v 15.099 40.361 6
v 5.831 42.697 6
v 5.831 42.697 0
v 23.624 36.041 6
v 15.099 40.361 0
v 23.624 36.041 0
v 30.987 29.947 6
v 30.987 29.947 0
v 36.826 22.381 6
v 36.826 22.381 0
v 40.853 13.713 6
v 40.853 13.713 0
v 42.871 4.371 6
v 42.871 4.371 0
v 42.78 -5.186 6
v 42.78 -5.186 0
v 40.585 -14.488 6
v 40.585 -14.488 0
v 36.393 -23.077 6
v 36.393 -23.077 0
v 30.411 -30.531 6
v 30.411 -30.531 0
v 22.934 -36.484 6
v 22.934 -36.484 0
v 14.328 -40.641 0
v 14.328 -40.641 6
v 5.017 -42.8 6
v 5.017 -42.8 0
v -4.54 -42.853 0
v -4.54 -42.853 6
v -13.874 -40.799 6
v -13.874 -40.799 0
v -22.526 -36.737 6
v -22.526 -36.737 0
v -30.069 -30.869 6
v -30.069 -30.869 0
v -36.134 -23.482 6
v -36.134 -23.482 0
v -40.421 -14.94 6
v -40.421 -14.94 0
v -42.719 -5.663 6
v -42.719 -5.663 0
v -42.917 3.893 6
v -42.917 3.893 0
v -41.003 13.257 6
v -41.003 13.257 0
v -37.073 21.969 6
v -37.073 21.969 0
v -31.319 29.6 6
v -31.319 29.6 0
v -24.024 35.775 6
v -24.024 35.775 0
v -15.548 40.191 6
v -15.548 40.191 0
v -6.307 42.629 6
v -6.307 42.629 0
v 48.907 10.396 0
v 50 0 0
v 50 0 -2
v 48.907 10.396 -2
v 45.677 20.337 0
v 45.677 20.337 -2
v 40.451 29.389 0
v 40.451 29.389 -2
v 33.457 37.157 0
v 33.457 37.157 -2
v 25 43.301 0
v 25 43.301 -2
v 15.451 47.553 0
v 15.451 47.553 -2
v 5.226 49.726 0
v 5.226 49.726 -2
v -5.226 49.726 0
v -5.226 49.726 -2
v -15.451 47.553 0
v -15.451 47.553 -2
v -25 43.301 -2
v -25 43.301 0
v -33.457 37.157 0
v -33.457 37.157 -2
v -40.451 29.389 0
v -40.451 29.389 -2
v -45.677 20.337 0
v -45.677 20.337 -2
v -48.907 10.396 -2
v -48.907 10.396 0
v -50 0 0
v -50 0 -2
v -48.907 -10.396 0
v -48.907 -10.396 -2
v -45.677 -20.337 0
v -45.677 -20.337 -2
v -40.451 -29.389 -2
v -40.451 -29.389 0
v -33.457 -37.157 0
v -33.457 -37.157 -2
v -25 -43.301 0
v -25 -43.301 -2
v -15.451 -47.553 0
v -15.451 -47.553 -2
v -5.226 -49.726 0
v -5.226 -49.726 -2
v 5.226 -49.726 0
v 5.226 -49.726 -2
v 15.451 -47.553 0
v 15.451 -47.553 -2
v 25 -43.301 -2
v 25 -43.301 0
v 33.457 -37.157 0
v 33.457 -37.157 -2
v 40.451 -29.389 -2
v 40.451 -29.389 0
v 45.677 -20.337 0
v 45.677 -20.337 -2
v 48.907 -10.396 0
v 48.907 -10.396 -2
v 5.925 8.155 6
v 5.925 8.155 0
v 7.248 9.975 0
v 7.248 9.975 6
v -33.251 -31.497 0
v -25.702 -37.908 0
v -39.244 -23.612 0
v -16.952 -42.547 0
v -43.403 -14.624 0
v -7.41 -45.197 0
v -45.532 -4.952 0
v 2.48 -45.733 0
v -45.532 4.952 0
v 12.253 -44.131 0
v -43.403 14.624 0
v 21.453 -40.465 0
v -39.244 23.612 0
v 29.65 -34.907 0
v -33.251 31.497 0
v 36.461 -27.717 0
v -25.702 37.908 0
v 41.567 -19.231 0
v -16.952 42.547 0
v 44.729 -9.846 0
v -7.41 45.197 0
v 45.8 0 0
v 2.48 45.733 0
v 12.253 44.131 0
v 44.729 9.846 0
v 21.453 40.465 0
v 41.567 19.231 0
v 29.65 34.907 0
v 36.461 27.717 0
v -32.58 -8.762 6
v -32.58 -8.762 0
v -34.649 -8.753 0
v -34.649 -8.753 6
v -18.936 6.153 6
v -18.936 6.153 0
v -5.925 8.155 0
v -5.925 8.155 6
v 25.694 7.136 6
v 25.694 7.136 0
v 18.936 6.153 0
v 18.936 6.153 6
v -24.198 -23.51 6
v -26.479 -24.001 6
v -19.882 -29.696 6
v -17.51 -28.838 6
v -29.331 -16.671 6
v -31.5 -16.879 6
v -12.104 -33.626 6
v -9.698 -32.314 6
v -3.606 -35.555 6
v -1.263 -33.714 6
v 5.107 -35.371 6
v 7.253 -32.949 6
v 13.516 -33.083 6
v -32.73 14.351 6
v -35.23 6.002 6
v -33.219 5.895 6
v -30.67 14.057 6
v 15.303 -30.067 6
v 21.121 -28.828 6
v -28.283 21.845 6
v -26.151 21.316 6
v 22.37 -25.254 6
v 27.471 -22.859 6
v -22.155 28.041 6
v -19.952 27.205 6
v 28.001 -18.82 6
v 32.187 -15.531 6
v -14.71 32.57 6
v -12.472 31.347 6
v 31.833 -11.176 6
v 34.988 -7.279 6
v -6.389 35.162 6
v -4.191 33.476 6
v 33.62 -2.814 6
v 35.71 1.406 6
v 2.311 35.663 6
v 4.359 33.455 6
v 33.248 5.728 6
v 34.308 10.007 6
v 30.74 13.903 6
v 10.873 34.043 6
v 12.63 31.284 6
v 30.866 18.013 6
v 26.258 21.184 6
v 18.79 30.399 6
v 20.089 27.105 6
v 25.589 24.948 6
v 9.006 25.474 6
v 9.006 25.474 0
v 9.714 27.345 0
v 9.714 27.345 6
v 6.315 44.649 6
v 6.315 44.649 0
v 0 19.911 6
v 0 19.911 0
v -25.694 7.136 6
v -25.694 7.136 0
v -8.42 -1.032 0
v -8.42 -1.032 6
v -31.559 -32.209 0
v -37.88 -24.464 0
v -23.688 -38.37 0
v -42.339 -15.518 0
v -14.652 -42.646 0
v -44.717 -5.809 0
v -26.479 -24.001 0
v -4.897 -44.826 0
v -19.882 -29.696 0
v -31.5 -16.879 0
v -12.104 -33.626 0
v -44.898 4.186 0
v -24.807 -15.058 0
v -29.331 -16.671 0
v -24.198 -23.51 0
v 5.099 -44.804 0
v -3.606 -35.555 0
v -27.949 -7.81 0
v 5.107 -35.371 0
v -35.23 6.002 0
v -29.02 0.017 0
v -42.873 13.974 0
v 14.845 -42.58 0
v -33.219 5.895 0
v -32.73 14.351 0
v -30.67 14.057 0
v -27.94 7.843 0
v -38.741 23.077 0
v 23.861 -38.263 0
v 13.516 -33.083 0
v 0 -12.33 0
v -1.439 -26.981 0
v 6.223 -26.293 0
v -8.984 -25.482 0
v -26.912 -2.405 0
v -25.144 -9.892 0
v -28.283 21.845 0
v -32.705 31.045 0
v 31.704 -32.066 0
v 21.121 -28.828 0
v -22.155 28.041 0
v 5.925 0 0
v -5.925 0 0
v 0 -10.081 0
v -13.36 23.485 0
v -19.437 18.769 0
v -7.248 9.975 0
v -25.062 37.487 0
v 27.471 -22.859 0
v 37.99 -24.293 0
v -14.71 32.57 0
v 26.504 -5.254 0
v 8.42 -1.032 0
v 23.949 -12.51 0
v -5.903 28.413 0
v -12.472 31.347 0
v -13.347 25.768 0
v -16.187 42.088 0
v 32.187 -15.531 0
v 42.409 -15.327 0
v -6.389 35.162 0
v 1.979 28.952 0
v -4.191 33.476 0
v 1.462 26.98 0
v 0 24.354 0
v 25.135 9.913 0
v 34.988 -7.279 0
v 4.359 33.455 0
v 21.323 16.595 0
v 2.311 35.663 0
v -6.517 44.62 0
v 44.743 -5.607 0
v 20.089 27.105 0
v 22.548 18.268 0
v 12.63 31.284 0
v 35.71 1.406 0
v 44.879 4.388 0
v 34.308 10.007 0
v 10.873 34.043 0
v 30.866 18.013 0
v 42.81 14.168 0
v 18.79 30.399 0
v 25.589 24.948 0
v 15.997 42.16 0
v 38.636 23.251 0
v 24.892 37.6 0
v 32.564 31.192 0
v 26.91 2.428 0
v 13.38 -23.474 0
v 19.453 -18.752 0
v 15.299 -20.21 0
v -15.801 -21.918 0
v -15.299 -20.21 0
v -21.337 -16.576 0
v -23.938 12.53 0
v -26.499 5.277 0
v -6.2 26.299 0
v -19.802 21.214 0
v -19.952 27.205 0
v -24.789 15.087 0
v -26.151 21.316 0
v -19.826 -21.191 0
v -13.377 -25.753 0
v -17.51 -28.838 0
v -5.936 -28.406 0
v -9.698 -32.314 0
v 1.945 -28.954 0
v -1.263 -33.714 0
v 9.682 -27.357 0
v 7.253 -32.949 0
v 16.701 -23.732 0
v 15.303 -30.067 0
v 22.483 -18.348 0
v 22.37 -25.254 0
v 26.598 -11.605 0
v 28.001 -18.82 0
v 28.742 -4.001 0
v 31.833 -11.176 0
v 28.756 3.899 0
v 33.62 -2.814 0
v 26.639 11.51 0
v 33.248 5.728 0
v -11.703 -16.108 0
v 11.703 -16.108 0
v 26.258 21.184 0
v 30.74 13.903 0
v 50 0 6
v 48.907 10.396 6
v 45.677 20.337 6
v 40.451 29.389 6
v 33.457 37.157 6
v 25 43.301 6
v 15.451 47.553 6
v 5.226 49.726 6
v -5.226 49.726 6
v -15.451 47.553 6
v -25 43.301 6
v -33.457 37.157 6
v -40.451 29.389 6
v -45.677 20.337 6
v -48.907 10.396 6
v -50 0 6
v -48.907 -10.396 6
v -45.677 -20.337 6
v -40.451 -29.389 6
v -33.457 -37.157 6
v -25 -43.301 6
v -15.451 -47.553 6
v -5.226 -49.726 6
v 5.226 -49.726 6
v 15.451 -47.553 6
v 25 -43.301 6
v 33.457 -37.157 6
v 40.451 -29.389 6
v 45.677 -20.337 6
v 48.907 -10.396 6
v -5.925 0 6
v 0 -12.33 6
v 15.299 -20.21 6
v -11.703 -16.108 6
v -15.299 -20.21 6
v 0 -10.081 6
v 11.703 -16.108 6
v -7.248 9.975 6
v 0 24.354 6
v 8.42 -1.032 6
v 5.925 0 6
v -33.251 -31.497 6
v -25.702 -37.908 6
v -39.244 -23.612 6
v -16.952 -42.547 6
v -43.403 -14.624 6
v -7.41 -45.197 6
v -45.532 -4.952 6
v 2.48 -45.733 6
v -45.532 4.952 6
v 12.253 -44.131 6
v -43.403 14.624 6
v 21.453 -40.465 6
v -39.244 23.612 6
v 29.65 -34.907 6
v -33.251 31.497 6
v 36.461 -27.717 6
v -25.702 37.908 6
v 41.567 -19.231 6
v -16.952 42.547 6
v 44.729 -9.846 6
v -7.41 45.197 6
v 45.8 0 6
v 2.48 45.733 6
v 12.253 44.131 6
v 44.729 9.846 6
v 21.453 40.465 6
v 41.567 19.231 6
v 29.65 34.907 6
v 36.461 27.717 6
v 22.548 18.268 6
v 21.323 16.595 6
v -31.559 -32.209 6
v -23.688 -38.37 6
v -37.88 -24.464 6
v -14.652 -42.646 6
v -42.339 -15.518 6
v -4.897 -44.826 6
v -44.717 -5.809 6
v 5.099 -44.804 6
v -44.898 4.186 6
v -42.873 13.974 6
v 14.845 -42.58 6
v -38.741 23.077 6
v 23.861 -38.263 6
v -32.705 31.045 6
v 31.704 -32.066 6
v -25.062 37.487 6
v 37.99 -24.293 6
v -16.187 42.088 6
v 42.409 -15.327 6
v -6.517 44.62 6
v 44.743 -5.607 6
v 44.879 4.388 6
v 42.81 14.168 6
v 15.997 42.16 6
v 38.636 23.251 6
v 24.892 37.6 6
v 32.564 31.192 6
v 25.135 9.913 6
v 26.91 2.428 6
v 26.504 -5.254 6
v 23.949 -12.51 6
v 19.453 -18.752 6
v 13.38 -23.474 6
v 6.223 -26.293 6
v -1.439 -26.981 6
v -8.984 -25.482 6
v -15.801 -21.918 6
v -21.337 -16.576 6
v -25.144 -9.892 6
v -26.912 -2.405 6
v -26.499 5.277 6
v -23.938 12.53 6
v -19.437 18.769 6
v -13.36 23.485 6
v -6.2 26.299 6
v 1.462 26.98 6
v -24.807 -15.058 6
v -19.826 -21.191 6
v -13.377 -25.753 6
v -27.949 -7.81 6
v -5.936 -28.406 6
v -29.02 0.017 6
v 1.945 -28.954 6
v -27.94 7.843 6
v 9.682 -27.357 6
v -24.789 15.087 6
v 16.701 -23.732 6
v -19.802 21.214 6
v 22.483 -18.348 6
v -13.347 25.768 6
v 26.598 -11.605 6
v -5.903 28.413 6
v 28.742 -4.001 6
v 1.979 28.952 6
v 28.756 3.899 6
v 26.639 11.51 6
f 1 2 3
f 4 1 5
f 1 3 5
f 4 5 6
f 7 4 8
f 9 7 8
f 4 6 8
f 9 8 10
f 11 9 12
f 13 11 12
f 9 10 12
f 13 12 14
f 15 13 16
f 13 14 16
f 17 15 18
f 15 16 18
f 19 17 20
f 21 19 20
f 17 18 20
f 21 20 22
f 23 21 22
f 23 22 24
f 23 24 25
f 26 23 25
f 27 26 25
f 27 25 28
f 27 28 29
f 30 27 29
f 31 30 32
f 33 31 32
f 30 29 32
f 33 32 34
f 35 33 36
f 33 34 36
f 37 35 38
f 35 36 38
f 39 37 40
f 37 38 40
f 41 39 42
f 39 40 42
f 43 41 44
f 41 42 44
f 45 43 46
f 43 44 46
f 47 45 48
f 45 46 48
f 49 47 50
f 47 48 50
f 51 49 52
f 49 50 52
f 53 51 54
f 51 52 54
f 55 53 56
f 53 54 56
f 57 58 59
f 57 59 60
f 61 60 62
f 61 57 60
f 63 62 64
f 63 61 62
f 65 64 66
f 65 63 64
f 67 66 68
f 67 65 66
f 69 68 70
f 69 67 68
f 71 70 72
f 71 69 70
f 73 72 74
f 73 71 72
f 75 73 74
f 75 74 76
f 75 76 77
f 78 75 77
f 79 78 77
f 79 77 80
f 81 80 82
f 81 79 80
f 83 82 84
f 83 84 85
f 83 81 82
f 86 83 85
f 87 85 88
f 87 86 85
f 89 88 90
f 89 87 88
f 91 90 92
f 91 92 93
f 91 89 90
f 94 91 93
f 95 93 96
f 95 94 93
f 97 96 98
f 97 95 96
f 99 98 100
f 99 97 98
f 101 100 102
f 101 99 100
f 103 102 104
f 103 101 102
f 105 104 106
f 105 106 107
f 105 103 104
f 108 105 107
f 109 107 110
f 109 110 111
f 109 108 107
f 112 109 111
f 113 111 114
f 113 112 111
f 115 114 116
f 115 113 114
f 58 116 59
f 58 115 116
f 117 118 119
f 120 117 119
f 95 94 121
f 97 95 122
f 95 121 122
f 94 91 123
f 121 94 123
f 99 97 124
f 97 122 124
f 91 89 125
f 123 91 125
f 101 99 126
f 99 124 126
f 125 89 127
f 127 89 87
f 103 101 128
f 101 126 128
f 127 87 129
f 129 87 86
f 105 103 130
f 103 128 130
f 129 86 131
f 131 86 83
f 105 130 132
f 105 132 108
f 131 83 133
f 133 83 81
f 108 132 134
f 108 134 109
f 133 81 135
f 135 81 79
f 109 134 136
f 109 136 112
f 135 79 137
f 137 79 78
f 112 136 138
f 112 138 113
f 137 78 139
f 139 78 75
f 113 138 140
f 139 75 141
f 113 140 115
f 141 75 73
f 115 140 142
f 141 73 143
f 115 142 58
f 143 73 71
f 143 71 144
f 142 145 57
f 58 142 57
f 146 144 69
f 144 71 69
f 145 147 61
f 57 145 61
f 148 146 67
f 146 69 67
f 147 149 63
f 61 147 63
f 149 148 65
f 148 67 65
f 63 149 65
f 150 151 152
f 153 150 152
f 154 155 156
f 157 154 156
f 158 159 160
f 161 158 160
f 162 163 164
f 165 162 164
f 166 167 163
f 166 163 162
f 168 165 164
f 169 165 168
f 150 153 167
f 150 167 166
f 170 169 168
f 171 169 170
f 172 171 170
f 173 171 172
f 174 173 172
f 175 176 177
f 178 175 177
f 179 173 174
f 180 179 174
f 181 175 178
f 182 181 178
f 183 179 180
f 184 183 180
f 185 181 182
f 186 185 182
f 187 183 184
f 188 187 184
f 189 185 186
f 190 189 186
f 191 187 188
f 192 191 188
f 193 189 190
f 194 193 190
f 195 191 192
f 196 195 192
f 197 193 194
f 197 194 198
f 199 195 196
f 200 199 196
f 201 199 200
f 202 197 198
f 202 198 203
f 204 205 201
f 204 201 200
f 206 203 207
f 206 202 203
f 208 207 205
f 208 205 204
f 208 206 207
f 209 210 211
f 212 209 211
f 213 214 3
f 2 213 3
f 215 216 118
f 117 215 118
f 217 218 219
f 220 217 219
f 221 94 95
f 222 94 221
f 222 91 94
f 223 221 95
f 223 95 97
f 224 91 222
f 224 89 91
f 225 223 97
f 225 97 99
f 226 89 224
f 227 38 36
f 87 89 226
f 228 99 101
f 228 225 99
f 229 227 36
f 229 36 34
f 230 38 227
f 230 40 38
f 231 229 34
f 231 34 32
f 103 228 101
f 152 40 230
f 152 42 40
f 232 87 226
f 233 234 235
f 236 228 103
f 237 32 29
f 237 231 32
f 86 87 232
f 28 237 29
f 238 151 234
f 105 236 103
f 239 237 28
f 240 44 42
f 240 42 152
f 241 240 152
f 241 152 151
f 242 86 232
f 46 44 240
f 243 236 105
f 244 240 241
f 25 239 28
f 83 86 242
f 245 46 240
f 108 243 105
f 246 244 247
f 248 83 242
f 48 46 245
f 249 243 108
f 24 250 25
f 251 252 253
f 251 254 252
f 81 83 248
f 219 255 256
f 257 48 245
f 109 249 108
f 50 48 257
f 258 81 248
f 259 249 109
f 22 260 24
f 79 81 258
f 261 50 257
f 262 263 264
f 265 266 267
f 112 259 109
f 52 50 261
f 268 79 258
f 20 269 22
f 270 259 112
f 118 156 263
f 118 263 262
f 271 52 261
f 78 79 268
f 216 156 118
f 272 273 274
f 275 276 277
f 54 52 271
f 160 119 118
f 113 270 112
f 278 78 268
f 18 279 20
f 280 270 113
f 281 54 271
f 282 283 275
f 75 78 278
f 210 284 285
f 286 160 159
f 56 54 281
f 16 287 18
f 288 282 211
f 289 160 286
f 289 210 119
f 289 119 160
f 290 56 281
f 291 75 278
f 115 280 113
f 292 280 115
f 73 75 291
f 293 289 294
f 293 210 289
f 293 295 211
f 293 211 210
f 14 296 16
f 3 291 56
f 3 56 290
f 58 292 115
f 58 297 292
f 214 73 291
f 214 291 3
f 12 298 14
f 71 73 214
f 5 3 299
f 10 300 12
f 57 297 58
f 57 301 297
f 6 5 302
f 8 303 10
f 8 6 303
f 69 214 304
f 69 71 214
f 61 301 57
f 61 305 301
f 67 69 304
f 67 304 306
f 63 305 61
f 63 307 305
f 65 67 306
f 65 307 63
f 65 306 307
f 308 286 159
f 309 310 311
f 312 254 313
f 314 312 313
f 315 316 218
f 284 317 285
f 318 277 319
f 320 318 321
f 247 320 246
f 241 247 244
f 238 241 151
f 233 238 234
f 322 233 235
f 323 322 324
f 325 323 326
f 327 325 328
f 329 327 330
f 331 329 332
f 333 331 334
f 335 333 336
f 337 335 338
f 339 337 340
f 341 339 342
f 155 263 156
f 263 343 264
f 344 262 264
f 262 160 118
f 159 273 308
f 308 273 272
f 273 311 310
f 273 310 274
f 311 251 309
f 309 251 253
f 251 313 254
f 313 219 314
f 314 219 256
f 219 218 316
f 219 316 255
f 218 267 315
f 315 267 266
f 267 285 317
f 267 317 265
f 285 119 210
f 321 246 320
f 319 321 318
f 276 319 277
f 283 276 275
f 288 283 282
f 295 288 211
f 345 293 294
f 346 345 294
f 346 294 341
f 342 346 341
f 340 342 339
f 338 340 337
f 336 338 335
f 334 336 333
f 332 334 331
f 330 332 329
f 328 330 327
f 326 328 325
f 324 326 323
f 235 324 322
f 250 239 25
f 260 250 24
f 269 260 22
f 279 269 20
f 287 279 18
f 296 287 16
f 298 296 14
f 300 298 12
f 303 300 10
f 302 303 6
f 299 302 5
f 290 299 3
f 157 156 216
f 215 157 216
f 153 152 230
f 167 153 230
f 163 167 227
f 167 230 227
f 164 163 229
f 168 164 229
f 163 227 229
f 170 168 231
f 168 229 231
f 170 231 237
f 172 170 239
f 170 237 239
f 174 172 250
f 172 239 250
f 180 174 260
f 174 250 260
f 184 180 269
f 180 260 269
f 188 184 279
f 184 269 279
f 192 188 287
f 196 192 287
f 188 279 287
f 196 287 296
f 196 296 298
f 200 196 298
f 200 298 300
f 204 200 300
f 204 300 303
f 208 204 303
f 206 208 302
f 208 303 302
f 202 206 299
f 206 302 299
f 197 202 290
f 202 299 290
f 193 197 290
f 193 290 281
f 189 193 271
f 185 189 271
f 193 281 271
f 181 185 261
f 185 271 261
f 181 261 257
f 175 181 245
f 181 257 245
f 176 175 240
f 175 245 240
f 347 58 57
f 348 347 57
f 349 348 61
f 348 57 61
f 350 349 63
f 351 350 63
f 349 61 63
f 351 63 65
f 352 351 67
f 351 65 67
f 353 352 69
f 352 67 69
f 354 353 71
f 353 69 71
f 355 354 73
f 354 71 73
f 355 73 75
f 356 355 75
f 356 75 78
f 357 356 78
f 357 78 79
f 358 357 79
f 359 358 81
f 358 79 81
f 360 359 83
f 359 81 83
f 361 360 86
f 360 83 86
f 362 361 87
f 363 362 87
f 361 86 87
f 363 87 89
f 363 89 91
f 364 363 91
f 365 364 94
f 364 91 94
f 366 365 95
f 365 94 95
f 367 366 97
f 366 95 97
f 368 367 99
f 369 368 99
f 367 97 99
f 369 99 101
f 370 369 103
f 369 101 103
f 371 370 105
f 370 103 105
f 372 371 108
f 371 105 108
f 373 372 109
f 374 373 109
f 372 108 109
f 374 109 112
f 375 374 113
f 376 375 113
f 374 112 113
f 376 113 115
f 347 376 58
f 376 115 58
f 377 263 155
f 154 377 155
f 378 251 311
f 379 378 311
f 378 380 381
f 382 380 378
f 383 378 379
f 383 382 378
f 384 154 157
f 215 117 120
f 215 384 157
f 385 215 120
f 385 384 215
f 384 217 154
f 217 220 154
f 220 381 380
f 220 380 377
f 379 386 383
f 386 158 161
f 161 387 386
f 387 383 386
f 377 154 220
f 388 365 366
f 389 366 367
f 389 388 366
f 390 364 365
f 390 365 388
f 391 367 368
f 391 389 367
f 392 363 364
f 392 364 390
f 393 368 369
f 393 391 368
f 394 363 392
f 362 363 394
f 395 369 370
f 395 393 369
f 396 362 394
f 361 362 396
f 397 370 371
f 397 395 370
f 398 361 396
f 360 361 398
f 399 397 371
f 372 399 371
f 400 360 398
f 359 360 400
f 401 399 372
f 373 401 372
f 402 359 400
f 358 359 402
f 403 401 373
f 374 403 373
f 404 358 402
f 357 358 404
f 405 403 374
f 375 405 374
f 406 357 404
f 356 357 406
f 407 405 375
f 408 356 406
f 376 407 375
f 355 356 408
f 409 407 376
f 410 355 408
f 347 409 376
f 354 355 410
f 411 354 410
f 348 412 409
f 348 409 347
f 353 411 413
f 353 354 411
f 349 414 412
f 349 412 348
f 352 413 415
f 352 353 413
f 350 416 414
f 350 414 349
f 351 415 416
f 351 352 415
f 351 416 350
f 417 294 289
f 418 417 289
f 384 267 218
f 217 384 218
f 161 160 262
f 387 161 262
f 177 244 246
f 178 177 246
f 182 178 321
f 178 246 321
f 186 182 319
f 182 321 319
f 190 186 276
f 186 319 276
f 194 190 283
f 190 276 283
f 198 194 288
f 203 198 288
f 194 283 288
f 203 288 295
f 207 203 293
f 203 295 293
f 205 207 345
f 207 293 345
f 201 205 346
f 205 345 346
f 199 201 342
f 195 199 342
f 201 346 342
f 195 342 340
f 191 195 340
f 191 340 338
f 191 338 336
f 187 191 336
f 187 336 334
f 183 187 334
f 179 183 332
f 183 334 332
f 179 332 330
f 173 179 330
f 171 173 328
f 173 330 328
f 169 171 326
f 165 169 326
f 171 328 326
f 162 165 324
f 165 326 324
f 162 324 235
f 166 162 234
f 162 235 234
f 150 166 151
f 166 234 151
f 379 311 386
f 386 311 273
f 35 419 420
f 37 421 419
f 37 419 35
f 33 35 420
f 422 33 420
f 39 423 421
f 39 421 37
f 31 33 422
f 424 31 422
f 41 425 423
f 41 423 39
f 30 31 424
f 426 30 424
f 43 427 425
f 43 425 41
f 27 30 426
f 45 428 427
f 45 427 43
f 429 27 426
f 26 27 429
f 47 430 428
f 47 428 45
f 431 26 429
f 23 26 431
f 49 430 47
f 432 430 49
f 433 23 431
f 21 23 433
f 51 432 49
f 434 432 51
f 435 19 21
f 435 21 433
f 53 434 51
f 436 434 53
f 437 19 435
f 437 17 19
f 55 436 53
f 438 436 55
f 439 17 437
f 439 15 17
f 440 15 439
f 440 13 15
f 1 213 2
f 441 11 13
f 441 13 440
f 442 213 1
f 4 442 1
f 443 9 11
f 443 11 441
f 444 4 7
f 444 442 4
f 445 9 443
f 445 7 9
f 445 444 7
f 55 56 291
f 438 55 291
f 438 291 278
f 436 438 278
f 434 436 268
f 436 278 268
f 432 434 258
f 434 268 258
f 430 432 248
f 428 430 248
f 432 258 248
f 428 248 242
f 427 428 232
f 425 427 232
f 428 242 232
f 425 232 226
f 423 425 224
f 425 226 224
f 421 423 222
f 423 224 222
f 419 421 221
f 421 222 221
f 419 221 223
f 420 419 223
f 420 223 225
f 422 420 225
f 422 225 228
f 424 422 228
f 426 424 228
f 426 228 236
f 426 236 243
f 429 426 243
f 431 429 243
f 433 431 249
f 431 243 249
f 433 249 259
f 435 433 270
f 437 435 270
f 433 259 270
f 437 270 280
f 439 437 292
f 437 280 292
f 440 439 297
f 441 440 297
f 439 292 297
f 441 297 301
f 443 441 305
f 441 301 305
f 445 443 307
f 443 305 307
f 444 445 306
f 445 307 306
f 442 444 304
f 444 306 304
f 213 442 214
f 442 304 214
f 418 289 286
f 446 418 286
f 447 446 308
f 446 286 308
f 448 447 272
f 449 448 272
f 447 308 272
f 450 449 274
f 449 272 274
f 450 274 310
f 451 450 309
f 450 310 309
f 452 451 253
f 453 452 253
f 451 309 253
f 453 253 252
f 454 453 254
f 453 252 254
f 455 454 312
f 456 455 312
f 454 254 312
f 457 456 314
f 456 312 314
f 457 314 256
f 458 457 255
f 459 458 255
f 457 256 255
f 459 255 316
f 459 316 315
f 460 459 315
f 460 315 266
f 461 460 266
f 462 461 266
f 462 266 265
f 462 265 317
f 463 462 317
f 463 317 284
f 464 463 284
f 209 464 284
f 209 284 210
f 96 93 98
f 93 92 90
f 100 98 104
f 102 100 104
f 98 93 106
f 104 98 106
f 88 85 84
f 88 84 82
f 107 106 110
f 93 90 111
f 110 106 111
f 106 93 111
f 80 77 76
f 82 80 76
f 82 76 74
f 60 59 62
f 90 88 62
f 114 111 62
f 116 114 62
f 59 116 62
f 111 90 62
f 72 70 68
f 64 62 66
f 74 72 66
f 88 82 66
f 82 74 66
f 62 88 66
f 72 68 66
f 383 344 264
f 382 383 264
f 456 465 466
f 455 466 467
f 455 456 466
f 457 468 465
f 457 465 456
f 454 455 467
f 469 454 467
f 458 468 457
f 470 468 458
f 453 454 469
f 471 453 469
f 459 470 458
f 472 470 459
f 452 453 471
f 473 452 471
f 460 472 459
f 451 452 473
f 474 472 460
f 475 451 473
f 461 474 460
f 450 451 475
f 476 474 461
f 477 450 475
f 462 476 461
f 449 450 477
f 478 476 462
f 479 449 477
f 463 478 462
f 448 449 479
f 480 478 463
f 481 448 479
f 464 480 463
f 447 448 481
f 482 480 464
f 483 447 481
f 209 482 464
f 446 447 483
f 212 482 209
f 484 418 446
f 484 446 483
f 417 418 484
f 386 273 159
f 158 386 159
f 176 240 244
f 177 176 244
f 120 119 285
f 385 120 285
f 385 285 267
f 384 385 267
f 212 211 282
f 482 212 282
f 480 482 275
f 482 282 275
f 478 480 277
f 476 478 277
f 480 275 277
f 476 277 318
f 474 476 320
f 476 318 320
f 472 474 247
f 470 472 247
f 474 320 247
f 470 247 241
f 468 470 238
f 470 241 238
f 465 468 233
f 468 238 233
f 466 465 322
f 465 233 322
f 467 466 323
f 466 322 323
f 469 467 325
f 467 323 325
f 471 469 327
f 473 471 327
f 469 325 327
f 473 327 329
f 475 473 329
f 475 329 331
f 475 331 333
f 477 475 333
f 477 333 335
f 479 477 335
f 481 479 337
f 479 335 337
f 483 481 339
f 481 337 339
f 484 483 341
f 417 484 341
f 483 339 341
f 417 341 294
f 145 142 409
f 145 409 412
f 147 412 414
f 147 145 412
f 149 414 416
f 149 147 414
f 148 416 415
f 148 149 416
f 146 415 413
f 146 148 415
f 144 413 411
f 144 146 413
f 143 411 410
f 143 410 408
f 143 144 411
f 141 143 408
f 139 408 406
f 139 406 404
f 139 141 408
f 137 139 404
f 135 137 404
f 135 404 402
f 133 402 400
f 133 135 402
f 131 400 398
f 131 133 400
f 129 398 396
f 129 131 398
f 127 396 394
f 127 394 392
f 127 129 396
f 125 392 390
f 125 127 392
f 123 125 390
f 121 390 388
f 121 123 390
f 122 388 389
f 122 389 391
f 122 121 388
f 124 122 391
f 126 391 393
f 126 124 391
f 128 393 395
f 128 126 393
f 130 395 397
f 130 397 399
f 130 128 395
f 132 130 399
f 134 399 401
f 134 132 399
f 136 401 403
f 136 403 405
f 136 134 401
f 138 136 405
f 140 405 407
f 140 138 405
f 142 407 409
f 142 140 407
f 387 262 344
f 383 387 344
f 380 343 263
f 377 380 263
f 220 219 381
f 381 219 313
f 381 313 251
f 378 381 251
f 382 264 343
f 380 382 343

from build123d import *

# Parameters (mm, degrees)
F0_R     = 50
F0_R_2   = 45.8000004292
F1_DEPTH = 2
F2_DEPTH = 6
F3_DEPTH = 6


# Not quite as in the source:
# - a feature names something its author has since deleted; it is built from what else it names


with BuildPart() as f1:
    # F0 (on Top) → F1 (new body)
    with BuildSketch(Plane.XY):
        Circle(F0_R)
        Circle(F0_R_2, mode=Mode.SUBTRACT)
        Circle(F0_R_2)
        with BuildLine():
            ThreePointArc((6.3153904824, 44.6486646761), (0.1018848259, -45.0929820902), (-6.5170868077, 44.6196704811))
            Line((-6.5170868077, 44.6196704811), (-6.3065913026, 42.6291207003))
            ThreePointArc((-6.3065913026, 42.6291207003), (0.2401945365, -43.0924277817), (5.83099002, 42.6967748305))
            Line((5.83099002, 42.6967748305), (6.3153904824, 44.6486646761))
        make_face(mode=Mode.SUBTRACT)
        with BuildLine():
            ThreePointArc((22.5482578893, 18.2677764277), (-16.757499251, -23.6922309693), (9.7139592016, 27.3454673773))
            Line((9.7139592016, 27.3454673773), (9.0060023348, 25.4744817671))
            ThreePointArc((9.0060023348, 25.4744817671), (-15.8011926323, -21.9175639786), (21.3231605276, 16.5945811779))
            Line((21.3231605276, 16.5945811779), (22.5482578893, 18.2677764277))
        make_face(mode=Mode.SUBTRACT)
        with BuildLine():
            ThreePointArc((-35.229941381, 6.0022501649), (35.7099355205, 1.405802927), (-34.6490596367, -8.7531961618))
            Line((-34.6490596367, -8.7531961618), (-32.5798660552, -8.7622896596))
            ThreePointArc((-32.5798660552, -8.7622896596), (33.7056090039, 1.4687797411), (-33.2185830072, 5.8950093511))
            Line((-33.2185830072, 5.8950093511), (-35.229941381, 6.0022501649))
        make_face(mode=Mode.SUBTRACT)
        Polygon((5.925275698, 8.1554423446), (0, 19.9105534703), (-5.925275698, 8.1554423446), (-18.9360616209, 6.1526993897), (-5.925275698, 0), (-11.7031296948, -16.1079761248), (0, -10.0806811245), (11.7031296948, -16.1079761248), (5.925275698, 0), (18.9360616209, 6.1526993897), (25.6938207233, 7.1360371941), (8.4203775276, -1.0324396403), (15.2991478945, -20.2096408815), (0, -12.3303402142), (-15.2991478945, -20.2096408815), (-8.4203775276, -1.0324396403), (-25.6938207233, 7.1360371941), (-7.2475921337, 9.9754547797), (0, 24.3538998118), (7.2475921337, 9.9754547797), align=None, mode=Mode.SUBTRACT)
        with BuildLine():
            Line((-6.3065913026, 42.6291207003), (-6.5170868077, 44.6196704811))
            ThreePointArc((-6.5170868077, 44.6196704811), (0.1018848259, -45.0929820902), (6.3153904824, 44.6486646761))
            Line((6.3153904824, 44.6486646761), (5.83099002, 42.6967748305))
            ThreePointArc((5.83099002, 42.6967748305), (0.2401945365, -43.0924277817), (-6.3065913026, 42.6291207003))
        make_face()
        with BuildLine():
            Line((-32.5798660552, -8.7622896596), (-34.6490596367, -8.7531961618))
            ThreePointArc((-34.6490596367, -8.7531961618), (35.7099355205, 1.405802927), (-35.229941381, 6.0022501649))
            Line((-35.229941381, 6.0022501649), (-33.2185830072, 5.8950093511))
            ThreePointArc((-33.2185830072, 5.8950093511), (33.7056090039, 1.4687797411), (-32.5798660552, -8.7622896596))
        make_face()
        with BuildLine():
            Line((9.0060023348, 25.4744817671), (9.7139592016, 27.3454673773))
            ThreePointArc((9.7139592016, 27.3454673773), (-16.757499251, -23.6922309693), (22.5482578893, 18.2677764277))
            Line((22.5482578893, 18.2677764277), (21.3231605276, 16.5945811779))
            ThreePointArc((21.3231605276, 16.5945811779), (-15.8011926323, -21.9175639786), (9.0060023348, 25.4744817671))
        make_face()
        Polygon((-5.925275698, 8.1554423446), (0, 19.9105534703), (5.925275698, 8.1554423446), (7.2475921337, 9.9754547797), (0, 24.3538998118), (-7.2475921337, 9.9754547797), (-25.6938207233, 7.1360371941), (-8.4203775276, -1.0324396403), (-15.2991478945, -20.2096408815), (0, -12.3303402142), (15.2991478945, -20.2096408815), (8.4203775276, -1.0324396403), (25.6938207233, 7.1360371941), (18.9360616209, 6.1526993897), (5.925275698, 0), (11.7031296948, -16.1079761248), (0, -10.0806811245), (-11.7031296948, -16.1079761248), (-5.925275698, 0), (-18.9360616209, 6.1526993897), align=None)
    extrude(amount=-F1_DEPTH)

    # F0 (on Top) → F2 (join)
    with BuildSketch(Plane.XY):
        with BuildLine():
            Line((-6.3065913026, 42.6291207003), (-6.5170868077, 44.6196704811))
            ThreePointArc((-6.5170868077, 44.6196704811), (0.1018848259, -45.0929820902), (6.3153904824, 44.6486646761))
            Line((6.3153904824, 44.6486646761), (5.83099002, 42.6967748305))
            ThreePointArc((5.83099002, 42.6967748305), (0.2401945365, -43.0924277817), (-6.3065913026, 42.6291207003))
        make_face()
        with BuildLine():
            Line((9.0060023348, 25.4744817671), (9.7139592016, 27.3454673773))
            ThreePointArc((9.7139592016, 27.3454673773), (-16.757499251, -23.6922309693), (22.5482578893, 18.2677764277))
            Line((22.5482578893, 18.2677764277), (21.3231605276, 16.5945811779))
            ThreePointArc((21.3231605276, 16.5945811779), (-15.8011926323, -21.9175639786), (9.0060023348, 25.4744817671))
        make_face()
        with BuildLine():
            Line((-32.5798660552, -8.7622896596), (-34.6490596367, -8.7531961618))
            ThreePointArc((-34.6490596367, -8.7531961618), (35.7099355205, 1.405802927), (-35.229941381, 6.0022501649))
            Line((-35.229941381, 6.0022501649), (-33.2185830072, 5.8950093511))
            ThreePointArc((-33.2185830072, 5.8950093511), (33.7056090039, 1.4687797411), (-32.5798660552, -8.7622896596))
        make_face()
        Polygon((-5.925275698, 8.1554423446), (0, 19.9105534703), (5.925275698, 8.1554423446), (7.2475921337, 9.9754547797), (0, 24.3538998118), (-7.2475921337, 9.9754547797), (-25.6938207233, 7.1360371941), (-8.4203775276, -1.0324396403), (-15.2991478945, -20.2096408815), (0, -12.3303402142), (15.2991478945, -20.2096408815), (8.4203775276, -1.0324396403), (25.6938207233, 7.1360371941), (18.9360616209, 6.1526993897), (5.925275698, 0), (11.7031296948, -16.1079761248), (0, -10.0806811245), (-11.7031296948, -16.1079761248), (-5.925275698, 0), (-18.9360616209, 6.1526993897), align=None)
    extrude(amount=F2_DEPTH)


with BuildPart() as f3:
    # F0 (on Top) → F3 (new body)
    with BuildSketch(Plane.XY):
        Circle(F0_R)
        Circle(F0_R_2, mode=Mode.SUBTRACT)
    extrude(amount=F3_DEPTH)


solid = Compound([f1.part, f3.part])
